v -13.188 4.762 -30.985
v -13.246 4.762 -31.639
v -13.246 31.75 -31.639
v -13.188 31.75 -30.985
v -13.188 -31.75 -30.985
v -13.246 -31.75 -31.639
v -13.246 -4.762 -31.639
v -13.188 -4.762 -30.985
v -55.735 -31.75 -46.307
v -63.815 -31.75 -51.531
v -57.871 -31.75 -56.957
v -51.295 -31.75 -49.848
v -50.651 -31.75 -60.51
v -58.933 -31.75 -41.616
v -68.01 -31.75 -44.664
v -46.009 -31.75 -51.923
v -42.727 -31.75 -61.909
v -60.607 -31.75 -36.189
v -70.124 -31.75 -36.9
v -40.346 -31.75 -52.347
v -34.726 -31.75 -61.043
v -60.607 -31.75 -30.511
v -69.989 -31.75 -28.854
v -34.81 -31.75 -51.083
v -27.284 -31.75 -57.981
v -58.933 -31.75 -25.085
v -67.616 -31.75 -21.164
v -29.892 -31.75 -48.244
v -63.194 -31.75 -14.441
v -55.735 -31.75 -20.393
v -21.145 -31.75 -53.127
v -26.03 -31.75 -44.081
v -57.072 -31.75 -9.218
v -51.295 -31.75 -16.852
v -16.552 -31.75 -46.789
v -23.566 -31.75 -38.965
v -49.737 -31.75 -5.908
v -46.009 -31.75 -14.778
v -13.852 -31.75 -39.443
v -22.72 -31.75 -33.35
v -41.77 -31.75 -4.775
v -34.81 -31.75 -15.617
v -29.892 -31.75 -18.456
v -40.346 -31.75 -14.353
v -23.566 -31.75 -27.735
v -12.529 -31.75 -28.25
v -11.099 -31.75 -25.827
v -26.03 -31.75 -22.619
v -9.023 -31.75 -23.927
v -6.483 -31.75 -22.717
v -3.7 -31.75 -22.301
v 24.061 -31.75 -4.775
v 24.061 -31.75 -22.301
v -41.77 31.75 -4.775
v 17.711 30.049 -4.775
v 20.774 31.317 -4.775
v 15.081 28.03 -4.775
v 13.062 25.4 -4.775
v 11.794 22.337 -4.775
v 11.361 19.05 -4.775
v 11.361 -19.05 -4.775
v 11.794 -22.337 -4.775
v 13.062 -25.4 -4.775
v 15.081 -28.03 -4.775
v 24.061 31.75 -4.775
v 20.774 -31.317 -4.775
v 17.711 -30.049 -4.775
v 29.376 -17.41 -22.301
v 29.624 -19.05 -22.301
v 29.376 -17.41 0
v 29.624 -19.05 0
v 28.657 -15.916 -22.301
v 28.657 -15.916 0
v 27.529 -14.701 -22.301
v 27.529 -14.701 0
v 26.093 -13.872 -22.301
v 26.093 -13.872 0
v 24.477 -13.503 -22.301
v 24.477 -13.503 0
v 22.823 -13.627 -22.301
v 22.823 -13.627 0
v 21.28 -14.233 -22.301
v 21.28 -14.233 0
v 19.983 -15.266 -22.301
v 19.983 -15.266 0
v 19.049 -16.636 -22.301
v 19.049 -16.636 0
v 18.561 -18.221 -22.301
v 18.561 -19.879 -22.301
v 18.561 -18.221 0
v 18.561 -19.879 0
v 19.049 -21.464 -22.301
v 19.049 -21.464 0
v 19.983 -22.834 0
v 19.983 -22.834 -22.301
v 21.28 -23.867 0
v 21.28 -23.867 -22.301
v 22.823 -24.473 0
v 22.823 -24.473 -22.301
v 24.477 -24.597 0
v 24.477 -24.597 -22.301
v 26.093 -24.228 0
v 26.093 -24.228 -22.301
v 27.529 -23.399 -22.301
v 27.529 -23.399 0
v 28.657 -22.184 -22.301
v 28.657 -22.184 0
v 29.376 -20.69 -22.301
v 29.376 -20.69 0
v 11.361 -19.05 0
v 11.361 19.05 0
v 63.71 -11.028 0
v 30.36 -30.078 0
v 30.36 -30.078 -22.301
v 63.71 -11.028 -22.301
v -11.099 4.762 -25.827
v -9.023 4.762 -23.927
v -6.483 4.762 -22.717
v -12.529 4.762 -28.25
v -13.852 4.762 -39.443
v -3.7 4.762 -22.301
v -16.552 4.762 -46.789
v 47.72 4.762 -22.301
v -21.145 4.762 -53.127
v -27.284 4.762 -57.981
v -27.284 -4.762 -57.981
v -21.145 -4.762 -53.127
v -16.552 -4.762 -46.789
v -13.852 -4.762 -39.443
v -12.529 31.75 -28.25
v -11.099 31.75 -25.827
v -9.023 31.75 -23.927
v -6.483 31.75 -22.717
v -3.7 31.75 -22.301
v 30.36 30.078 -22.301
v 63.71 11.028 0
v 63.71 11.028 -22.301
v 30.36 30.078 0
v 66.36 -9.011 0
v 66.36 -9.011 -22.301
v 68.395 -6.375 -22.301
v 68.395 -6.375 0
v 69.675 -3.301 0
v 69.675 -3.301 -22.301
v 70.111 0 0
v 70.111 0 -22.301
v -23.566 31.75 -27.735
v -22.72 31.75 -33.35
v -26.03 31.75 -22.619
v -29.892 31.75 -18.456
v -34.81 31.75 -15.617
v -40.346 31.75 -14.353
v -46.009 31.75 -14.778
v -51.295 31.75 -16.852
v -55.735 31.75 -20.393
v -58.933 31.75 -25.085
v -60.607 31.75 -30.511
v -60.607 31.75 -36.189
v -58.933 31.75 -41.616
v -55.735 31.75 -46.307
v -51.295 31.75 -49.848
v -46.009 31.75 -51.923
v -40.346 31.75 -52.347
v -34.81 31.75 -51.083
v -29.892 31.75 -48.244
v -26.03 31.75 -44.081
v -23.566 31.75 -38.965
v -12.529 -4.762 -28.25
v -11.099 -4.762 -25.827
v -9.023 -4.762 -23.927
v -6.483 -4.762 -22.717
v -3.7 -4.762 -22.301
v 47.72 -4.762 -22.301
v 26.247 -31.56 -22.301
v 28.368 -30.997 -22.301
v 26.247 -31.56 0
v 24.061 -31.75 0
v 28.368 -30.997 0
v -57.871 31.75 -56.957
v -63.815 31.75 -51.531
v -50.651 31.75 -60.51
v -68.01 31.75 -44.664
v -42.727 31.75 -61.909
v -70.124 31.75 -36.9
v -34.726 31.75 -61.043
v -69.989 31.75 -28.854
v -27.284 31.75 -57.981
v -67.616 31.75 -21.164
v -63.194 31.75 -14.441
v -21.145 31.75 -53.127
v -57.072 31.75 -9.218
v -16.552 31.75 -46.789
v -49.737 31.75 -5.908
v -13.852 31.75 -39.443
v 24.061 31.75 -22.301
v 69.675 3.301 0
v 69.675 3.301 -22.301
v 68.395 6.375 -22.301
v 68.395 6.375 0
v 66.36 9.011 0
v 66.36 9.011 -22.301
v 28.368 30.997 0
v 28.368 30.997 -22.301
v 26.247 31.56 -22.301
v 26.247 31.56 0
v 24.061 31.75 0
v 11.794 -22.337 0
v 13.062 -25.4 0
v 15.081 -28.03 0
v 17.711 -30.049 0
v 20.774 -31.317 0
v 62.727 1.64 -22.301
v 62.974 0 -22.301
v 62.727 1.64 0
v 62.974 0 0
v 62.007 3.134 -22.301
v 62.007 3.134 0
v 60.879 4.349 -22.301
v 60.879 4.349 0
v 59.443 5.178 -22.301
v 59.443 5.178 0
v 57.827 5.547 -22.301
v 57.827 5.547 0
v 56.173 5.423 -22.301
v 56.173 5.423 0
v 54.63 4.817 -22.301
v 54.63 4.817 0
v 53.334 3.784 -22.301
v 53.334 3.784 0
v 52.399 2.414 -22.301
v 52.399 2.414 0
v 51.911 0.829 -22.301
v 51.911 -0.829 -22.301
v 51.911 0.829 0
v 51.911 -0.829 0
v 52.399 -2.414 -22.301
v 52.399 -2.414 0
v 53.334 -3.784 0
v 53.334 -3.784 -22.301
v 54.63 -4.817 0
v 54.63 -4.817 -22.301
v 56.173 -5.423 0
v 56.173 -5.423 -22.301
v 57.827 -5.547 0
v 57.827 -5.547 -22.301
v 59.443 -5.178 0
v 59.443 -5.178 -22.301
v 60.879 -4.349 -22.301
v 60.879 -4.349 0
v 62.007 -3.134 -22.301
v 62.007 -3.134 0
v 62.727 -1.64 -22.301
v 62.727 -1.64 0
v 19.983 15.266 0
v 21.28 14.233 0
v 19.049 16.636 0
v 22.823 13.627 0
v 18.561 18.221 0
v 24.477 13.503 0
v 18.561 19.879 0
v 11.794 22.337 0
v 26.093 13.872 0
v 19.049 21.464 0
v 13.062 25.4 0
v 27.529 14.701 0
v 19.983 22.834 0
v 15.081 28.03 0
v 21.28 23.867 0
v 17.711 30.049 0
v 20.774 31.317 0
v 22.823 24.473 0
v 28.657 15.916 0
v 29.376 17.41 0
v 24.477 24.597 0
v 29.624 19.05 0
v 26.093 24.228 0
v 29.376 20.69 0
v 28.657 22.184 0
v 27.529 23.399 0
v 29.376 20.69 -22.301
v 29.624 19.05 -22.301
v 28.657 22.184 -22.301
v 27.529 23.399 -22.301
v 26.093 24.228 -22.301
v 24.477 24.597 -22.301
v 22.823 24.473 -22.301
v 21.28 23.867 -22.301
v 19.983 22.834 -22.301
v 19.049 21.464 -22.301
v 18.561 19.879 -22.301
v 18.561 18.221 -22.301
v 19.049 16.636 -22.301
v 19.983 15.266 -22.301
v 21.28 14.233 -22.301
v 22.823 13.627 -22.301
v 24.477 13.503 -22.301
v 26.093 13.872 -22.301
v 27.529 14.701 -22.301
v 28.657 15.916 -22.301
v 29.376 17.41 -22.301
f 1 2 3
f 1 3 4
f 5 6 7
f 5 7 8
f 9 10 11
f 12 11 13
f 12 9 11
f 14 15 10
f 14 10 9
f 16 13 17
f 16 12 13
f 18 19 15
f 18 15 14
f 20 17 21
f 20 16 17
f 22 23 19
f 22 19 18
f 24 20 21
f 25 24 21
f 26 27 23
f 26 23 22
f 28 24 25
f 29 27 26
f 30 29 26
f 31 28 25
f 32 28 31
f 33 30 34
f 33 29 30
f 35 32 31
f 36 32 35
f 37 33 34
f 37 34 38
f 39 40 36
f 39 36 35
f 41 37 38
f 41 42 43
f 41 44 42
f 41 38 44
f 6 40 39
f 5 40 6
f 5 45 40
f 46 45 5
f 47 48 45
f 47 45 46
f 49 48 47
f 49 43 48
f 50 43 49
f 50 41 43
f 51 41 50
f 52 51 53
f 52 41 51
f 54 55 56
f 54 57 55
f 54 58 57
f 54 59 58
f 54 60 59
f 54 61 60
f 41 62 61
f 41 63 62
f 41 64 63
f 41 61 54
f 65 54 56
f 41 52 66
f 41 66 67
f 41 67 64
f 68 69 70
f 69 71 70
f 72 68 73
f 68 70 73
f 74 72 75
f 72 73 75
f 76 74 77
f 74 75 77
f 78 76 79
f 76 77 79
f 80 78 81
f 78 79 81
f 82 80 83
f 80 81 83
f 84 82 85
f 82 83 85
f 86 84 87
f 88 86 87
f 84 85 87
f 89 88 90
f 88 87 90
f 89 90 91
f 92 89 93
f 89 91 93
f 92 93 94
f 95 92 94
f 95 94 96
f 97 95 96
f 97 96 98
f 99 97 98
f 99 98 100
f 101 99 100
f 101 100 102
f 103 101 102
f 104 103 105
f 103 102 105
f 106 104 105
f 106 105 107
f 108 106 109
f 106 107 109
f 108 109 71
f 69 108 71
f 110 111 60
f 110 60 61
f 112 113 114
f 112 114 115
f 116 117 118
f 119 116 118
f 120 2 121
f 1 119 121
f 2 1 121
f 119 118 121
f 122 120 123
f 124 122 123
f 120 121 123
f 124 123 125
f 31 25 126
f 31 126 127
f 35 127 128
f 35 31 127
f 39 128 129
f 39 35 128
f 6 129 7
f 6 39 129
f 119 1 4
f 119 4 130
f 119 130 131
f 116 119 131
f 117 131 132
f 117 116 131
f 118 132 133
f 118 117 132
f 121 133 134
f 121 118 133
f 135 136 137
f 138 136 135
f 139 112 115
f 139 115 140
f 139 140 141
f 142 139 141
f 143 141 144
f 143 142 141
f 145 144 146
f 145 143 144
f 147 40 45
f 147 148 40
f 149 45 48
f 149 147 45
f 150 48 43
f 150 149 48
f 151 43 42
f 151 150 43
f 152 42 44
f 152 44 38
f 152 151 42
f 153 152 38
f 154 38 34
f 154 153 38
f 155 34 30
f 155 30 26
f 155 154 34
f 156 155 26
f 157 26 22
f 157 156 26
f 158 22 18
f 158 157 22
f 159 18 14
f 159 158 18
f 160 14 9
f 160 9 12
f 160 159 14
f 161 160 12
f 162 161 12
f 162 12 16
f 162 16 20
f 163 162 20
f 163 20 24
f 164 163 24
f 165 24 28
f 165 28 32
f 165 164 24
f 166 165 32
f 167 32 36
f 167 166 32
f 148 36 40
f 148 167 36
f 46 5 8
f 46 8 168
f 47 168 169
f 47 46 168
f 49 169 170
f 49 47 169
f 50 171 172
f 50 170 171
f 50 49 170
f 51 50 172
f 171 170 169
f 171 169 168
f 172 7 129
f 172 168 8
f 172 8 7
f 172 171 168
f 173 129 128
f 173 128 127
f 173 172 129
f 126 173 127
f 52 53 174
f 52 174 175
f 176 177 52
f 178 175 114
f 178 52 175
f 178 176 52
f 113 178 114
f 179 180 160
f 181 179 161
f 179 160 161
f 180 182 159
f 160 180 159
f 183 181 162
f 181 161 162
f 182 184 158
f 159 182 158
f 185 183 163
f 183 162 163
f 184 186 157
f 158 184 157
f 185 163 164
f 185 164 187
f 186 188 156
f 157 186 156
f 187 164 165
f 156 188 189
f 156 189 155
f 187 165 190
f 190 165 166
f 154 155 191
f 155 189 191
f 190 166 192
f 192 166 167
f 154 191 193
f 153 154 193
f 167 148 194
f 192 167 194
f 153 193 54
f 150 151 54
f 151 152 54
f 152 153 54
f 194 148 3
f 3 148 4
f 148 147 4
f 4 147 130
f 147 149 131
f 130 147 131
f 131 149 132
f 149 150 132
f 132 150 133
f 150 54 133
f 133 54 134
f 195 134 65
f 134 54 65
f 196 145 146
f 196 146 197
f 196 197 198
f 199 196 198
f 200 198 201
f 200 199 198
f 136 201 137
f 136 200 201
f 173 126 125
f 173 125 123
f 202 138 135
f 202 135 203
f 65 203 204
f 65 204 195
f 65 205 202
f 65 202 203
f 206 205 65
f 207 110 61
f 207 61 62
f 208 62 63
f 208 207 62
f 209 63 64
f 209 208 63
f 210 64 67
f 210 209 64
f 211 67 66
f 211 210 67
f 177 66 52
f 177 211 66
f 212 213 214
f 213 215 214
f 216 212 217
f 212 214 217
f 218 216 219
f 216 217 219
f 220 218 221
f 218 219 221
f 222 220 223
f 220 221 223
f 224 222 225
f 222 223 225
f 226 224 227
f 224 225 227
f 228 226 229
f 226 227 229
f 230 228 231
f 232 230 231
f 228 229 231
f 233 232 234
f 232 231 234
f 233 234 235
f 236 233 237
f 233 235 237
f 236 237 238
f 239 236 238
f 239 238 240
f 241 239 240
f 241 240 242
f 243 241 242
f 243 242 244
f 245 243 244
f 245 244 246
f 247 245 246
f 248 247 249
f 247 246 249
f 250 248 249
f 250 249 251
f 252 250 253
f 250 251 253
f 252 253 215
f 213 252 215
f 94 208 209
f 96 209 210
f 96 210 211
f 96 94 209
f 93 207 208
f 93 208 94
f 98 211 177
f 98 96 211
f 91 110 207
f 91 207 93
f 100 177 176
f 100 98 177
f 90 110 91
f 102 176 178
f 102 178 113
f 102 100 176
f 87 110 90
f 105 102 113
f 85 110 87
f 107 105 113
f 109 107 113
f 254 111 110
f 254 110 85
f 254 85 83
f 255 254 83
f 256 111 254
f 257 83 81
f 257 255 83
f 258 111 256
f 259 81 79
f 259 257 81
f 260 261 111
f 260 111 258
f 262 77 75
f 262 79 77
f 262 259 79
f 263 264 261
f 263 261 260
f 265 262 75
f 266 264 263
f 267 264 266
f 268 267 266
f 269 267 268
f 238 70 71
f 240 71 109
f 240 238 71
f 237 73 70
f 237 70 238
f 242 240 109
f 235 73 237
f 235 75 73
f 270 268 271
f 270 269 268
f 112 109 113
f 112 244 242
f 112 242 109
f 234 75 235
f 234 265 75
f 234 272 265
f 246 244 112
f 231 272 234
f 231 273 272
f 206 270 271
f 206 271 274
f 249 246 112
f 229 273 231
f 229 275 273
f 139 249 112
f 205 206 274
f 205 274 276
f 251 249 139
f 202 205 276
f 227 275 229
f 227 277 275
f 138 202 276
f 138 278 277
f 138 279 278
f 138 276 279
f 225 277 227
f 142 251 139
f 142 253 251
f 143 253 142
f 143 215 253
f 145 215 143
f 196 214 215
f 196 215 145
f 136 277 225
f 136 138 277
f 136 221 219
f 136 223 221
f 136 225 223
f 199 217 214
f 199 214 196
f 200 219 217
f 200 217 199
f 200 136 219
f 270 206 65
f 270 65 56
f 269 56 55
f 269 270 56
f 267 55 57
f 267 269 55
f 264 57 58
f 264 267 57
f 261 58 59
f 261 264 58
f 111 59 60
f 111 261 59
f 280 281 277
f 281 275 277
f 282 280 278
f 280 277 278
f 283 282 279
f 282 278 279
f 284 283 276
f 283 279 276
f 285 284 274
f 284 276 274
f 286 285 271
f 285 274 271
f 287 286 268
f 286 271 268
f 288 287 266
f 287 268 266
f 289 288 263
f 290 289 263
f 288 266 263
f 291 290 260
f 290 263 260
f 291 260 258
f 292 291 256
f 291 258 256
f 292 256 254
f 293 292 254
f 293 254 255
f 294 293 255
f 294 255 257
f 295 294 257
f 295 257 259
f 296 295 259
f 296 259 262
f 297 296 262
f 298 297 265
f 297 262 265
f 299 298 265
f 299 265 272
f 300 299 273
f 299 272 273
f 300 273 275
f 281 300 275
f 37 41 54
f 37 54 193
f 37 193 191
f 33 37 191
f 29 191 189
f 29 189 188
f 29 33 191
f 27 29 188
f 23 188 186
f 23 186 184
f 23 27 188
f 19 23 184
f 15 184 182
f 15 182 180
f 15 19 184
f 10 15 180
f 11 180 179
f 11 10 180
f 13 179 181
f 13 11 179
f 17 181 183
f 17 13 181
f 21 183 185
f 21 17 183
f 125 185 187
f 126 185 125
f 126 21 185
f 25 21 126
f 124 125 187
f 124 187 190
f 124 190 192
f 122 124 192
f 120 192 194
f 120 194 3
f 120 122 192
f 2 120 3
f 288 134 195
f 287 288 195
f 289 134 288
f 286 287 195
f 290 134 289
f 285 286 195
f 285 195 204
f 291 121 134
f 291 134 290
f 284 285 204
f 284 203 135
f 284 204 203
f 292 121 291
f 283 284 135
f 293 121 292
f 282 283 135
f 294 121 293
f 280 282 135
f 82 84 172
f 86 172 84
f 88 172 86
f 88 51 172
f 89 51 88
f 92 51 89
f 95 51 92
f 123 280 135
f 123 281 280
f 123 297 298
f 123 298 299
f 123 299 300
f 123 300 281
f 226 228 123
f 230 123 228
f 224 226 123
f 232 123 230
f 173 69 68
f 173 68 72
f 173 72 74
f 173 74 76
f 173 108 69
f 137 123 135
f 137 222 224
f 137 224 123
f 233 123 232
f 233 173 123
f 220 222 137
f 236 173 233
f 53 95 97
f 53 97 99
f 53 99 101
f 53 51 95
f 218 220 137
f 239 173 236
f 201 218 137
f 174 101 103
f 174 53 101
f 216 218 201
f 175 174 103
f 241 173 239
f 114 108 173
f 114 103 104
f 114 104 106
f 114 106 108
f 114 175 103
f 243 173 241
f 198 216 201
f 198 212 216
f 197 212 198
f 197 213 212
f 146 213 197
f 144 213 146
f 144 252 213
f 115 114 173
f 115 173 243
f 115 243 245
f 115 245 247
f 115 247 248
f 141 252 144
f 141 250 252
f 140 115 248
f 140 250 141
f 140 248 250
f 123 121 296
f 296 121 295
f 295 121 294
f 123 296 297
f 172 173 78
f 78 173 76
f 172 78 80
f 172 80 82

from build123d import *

# Parameters (mm, degrees)
F0_R     = 19.05
F1_DEPTH = 31.75
F2_DEPTH = 4.7625
F3_R     = 5.5626
F4_DEPTH = 4.7752
F5_DEPTH = 61.9262
F6_DEPTH = 61.9262


with BuildPart() as f1:
    # F0 (on Front) → F1 (new body, symmetric)
    with BuildSketch(Plane.XZ):
        with BuildLine():
            Line((70.111208, -4.7752), (-41.769909, -4.7752))
            ThreePointArc((-41.769909, -4.7752), (-69.341332, -40.856681), (-27.284214, -57.981385))
            ThreePointArc((-27.284214, -57.981385), (-16.552296, -46.789048), (-13.246168, -31.639394))
            Line((-13.246168, -31.639394), (-13.188227, -30.985492))
            ThreePointArc((-13.188227, -30.985492), (-10.131493, -24.800057), (-3.700401, -22.3012))
            Line((-3.700401, -22.3012), (47.719827, -22.3012))
            Line((47.719827, -22.3012), (70.111208, -22.3012))
            Line((70.111208, -22.3012), (70.111208, -4.7752))
        make_face()
        with Locations((-41.769909, -33.3502)):
            Circle(F0_R, mode=Mode.SUBTRACT)
    extrude(amount=F1_DEPTH, both=True)

    # F0 (on Front) → F2 (join, symmetric)
    with BuildSketch(Plane.XZ):
        with BuildLine():
            ThreePointArc((-13.246168, -31.639394), (-16.552296, -46.789048), (-27.284214, -57.981385))
            Line((-27.284214, -57.981385), (47.719827, -22.3012))
            Line((47.719827, -22.3012), (-3.700401, -22.3012))
            ThreePointArc((-3.700401, -22.3012), (-10.131493, -24.800057), (-13.188227, -30.985492))
            Line((-13.188227, -30.985492), (-13.246168, -31.639394))
        make_face()
    extrude(amount=F2_DEPTH, both=True)

    # F3 (on Top) → F4 (join)
    with BuildSketch(Plane.XY):
        with BuildLine():
            Line((11.361008, 19.05), (11.361008, -19.05))
            ThreePointArc((11.361008, -19.05), (15.080752, -28.030256), (24.061008, -31.75))
            ThreePointArc((24.061008, -31.75), (27.319684, -31.324813), (30.360163, -30.077721))
            Line((30.360163, -30.077721), (63.710363, -11.027721))
            ThreePointArc((63.710363, -11.027721), (68.395043, -6.375372), (70.111208, 0))
            ThreePointArc((70.111208, 0), (68.395043, 6.375372), (63.710363, 11.027721))
            Line((63.710363, 11.027721), (30.360163, 30.077721))
            ThreePointArc((30.360163, 30.077721), (27.319684, 31.324813), (24.061008, 31.75))
            ThreePointArc((24.061008, 31.75), (15.080752, 28.030256), (11.361008, 19.05))
        make_face()
        with Locations((24.061008, -19.05)):
            Circle(F3_R, mode=Mode.SUBTRACT)
        with Locations((24.061008, 19.05)):
            Circle(F3_R, mode=Mode.SUBTRACT)
        with Locations((57.411208, 0)):
            Circle(F3_R, mode=Mode.SUBTRACT)
    extrude(amount=-F4_DEPTH)

    # F3 (on Top) → F5 (cut, through all)
    with BuildSketch(Plane.XY):
        with Locations((24.061008, 19.05)):
            Circle(F3_R)
        with Locations((57.411208, 0)):
            Circle(F3_R)
        with Locations((24.061008, -19.05)):
            Circle(F3_R)
    extrude(amount=-F5_DEPTH, mode=Mode.SUBTRACT)

    # F3 (on Top) → F6 (cut, through all)
    with BuildSketch(Plane.XY):
        with BuildLine():
            ThreePointArc((30.360163, -30.077721), (27.319684, -31.324813), (24.061008, -31.75))
            Line((24.061008, -31.75), (70.111208, -31.75))
            Line((70.111208, -31.75), (70.111208, 0))
            ThreePointArc((70.111208, 0), (68.395043, -6.375372), (63.710363, -11.027721))
            Line((63.710363, -11.027721), (30.360163, -30.077721))
        make_face()
        with BuildLine():
            Line((70.111208, 31.75), (24.061008, 31.75))
            ThreePointArc((24.061008, 31.75), (27.319684, 31.324813), (30.360163, 30.077721))
            Line((30.360163, 30.077721), (63.710363, 11.027721))
            ThreePointArc((63.710363, 11.027721), (68.395043, 6.375372), (70.111208, 0))
            Line((70.111208, 0), (70.111208, 31.75))
        make_face()
    extrude(amount=-F6_DEPTH, mode=Mode.SUBTRACT)


solid = f1.part
